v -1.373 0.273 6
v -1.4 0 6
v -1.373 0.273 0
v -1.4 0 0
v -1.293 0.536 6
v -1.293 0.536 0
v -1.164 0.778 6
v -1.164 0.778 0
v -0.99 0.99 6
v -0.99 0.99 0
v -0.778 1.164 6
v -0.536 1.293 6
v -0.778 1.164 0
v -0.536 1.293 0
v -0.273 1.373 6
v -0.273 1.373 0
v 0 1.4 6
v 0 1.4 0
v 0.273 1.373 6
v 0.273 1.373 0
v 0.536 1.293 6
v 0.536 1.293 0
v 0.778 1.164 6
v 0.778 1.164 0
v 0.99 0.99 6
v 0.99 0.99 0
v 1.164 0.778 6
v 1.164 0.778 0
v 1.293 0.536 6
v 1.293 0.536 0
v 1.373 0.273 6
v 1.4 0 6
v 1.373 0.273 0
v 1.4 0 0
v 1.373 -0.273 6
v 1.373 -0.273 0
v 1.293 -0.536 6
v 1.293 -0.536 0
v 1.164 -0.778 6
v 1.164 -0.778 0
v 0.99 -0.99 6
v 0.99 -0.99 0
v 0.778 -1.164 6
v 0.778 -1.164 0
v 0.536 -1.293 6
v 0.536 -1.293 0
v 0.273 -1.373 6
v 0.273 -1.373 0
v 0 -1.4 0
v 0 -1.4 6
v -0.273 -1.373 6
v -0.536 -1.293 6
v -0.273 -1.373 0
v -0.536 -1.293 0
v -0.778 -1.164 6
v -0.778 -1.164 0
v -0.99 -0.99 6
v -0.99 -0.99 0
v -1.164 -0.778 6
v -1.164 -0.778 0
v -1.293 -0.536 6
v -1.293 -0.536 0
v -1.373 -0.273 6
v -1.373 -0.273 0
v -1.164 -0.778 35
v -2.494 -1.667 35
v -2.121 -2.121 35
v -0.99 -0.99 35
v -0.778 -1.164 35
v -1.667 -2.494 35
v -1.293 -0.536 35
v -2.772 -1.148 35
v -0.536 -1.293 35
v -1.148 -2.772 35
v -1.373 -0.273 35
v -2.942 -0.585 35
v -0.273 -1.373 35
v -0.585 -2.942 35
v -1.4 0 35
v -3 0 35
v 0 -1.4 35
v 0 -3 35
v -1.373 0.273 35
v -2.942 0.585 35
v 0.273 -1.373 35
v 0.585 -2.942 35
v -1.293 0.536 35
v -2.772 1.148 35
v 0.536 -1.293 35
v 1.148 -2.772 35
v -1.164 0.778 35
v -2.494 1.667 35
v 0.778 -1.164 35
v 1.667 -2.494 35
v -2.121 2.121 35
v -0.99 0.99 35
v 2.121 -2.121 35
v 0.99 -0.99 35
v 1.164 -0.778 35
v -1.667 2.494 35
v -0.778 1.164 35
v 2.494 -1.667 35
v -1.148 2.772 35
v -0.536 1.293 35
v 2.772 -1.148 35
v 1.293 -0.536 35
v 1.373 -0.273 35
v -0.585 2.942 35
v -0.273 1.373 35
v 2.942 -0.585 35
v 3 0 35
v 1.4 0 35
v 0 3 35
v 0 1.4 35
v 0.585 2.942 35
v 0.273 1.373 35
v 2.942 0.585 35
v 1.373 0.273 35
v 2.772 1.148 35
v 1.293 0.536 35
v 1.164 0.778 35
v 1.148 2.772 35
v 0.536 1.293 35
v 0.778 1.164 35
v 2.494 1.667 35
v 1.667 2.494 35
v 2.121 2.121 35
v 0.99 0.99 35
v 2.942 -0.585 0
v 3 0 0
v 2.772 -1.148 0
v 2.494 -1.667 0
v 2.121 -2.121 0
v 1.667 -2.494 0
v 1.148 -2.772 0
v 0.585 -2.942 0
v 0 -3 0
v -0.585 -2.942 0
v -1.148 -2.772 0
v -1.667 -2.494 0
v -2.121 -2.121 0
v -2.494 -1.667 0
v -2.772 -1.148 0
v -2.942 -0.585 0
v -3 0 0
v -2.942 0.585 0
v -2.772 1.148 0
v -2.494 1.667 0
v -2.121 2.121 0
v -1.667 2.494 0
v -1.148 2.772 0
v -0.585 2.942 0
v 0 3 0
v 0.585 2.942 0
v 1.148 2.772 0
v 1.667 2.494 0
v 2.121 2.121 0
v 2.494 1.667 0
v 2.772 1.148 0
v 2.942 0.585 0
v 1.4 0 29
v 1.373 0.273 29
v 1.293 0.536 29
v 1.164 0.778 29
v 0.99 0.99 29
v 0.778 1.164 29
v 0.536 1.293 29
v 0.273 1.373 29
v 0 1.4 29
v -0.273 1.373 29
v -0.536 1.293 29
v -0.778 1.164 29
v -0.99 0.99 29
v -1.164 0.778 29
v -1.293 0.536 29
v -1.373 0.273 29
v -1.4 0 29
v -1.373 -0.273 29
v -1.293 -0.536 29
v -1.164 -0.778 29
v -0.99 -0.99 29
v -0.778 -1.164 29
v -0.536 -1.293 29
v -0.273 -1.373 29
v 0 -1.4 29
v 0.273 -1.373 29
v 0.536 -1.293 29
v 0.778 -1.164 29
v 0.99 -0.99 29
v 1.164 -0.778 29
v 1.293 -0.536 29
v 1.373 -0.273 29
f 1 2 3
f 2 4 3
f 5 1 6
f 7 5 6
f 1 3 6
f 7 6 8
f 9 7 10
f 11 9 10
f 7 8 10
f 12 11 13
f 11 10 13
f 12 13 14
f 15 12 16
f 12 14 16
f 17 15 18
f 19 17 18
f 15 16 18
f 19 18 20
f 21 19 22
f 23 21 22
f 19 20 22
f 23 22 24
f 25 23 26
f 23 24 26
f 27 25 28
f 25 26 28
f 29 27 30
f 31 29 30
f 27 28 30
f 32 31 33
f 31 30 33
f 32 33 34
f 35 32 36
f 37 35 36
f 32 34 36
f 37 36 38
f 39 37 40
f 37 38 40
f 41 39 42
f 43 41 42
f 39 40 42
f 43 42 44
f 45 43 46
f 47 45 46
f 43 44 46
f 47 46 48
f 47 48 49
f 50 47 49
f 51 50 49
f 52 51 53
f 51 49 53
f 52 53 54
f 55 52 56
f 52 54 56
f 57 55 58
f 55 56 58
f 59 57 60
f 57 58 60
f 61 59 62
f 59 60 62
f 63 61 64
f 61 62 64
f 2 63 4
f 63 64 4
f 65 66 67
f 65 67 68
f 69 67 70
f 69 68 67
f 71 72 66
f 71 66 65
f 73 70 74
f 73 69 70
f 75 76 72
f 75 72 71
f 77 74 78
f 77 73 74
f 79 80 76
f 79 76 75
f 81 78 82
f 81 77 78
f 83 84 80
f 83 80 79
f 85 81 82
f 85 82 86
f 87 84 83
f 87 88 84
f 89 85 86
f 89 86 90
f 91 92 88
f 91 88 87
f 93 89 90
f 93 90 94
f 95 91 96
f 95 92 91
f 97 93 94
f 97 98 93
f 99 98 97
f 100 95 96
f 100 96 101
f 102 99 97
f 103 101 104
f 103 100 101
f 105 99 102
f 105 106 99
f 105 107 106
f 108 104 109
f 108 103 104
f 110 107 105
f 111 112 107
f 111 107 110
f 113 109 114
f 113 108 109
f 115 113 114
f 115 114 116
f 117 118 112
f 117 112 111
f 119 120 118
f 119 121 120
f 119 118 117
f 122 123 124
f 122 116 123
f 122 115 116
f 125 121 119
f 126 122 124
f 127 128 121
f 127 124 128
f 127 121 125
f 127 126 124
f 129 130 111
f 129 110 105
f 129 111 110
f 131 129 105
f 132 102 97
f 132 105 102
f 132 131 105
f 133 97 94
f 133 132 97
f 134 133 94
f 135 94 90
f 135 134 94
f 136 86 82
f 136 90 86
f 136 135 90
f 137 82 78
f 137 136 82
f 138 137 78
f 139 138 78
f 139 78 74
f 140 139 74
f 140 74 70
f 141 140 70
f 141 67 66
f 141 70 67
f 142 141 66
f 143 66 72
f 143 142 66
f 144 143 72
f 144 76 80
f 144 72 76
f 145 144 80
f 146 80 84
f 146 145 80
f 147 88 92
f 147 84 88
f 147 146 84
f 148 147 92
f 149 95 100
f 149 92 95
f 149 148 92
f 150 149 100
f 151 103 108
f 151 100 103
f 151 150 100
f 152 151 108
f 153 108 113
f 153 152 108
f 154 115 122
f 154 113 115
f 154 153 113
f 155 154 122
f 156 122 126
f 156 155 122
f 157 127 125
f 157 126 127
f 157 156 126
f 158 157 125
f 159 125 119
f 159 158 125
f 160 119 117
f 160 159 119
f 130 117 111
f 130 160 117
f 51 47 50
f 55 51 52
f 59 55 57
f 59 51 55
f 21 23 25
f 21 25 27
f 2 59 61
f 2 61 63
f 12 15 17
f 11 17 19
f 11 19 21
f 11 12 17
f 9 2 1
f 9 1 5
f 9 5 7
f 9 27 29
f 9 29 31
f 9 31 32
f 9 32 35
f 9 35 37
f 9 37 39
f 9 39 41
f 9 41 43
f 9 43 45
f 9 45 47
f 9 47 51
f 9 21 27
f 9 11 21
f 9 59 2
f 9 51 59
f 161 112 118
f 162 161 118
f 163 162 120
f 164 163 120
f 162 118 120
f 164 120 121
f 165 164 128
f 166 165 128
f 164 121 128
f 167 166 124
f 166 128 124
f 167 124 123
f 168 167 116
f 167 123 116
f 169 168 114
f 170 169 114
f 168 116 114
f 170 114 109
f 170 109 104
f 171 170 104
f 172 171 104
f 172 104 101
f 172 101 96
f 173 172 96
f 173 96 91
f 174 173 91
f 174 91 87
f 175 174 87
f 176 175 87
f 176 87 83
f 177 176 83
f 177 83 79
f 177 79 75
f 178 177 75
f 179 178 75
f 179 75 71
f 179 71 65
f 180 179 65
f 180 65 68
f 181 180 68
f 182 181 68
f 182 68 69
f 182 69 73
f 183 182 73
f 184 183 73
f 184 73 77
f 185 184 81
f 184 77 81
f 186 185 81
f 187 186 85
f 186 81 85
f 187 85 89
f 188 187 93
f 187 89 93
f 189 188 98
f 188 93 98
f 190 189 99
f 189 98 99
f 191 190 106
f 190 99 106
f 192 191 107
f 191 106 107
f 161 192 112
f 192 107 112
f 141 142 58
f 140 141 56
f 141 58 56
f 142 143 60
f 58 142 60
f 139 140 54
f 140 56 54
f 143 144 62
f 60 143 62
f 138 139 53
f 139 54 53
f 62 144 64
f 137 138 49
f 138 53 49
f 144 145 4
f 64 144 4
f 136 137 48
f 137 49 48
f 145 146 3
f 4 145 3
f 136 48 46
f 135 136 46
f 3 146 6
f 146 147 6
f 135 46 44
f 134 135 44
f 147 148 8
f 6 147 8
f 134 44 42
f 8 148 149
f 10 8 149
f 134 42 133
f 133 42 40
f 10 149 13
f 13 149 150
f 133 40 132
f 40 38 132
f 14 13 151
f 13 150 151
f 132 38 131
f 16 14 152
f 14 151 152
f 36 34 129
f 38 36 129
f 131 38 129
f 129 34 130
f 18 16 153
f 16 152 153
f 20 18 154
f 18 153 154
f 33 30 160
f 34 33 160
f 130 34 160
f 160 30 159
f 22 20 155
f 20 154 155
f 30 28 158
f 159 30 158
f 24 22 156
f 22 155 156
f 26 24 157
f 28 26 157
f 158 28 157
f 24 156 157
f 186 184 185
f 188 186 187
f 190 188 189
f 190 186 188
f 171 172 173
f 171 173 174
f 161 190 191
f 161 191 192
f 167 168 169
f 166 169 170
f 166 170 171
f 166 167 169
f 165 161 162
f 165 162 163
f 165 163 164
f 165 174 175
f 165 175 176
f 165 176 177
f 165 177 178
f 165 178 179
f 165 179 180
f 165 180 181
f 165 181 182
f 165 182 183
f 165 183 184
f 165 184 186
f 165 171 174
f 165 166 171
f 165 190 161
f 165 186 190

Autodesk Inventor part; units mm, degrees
ref_plane "YZ Plane" through (0, 0, 0) normal (1, 0, 0) x (0, 1, 0)
ref_plane "XZ Plane" through (0, 0, 0) normal (0, 1, 0) x (-1, 0, 0)
ref_plane "XY Plane" through (0, 0, 0) normal (0, 0, 1) x (1, 0, 0)
sketch "スケッチ1" plane through (0, 0, 0) normal (0, 0, 1) x (1, 0, 0)
  circle A0 centre (0, 0) radius 3
  dimension "d0" = 6
extrude "押し出し1" add sketch "スケッチ1" along normal blind 35
sketch "スケッチ2" plane through (0, 0, 35) normal (0, 0, 1) x (1, 0, 0)
  circle A0 centre (0, 0) radius 1.4
  dimension "d3" = 2.8
extrude "押し出し2" cut sketch "スケッチ2" against normal blind 6
sketch "スケッチ3" plane through (0, 0, 0) normal (0, 0, -1) x (-1, 0, 0)
  circle A0 centre (0, 0) radius 1.4 projected
  circle A1 centre (0, 0) radius 1.4
extrude "押し出し3" cut sketch "スケッチ3" against normal blind 6
properties part number "34mm" material "アルミニウム 6061"
